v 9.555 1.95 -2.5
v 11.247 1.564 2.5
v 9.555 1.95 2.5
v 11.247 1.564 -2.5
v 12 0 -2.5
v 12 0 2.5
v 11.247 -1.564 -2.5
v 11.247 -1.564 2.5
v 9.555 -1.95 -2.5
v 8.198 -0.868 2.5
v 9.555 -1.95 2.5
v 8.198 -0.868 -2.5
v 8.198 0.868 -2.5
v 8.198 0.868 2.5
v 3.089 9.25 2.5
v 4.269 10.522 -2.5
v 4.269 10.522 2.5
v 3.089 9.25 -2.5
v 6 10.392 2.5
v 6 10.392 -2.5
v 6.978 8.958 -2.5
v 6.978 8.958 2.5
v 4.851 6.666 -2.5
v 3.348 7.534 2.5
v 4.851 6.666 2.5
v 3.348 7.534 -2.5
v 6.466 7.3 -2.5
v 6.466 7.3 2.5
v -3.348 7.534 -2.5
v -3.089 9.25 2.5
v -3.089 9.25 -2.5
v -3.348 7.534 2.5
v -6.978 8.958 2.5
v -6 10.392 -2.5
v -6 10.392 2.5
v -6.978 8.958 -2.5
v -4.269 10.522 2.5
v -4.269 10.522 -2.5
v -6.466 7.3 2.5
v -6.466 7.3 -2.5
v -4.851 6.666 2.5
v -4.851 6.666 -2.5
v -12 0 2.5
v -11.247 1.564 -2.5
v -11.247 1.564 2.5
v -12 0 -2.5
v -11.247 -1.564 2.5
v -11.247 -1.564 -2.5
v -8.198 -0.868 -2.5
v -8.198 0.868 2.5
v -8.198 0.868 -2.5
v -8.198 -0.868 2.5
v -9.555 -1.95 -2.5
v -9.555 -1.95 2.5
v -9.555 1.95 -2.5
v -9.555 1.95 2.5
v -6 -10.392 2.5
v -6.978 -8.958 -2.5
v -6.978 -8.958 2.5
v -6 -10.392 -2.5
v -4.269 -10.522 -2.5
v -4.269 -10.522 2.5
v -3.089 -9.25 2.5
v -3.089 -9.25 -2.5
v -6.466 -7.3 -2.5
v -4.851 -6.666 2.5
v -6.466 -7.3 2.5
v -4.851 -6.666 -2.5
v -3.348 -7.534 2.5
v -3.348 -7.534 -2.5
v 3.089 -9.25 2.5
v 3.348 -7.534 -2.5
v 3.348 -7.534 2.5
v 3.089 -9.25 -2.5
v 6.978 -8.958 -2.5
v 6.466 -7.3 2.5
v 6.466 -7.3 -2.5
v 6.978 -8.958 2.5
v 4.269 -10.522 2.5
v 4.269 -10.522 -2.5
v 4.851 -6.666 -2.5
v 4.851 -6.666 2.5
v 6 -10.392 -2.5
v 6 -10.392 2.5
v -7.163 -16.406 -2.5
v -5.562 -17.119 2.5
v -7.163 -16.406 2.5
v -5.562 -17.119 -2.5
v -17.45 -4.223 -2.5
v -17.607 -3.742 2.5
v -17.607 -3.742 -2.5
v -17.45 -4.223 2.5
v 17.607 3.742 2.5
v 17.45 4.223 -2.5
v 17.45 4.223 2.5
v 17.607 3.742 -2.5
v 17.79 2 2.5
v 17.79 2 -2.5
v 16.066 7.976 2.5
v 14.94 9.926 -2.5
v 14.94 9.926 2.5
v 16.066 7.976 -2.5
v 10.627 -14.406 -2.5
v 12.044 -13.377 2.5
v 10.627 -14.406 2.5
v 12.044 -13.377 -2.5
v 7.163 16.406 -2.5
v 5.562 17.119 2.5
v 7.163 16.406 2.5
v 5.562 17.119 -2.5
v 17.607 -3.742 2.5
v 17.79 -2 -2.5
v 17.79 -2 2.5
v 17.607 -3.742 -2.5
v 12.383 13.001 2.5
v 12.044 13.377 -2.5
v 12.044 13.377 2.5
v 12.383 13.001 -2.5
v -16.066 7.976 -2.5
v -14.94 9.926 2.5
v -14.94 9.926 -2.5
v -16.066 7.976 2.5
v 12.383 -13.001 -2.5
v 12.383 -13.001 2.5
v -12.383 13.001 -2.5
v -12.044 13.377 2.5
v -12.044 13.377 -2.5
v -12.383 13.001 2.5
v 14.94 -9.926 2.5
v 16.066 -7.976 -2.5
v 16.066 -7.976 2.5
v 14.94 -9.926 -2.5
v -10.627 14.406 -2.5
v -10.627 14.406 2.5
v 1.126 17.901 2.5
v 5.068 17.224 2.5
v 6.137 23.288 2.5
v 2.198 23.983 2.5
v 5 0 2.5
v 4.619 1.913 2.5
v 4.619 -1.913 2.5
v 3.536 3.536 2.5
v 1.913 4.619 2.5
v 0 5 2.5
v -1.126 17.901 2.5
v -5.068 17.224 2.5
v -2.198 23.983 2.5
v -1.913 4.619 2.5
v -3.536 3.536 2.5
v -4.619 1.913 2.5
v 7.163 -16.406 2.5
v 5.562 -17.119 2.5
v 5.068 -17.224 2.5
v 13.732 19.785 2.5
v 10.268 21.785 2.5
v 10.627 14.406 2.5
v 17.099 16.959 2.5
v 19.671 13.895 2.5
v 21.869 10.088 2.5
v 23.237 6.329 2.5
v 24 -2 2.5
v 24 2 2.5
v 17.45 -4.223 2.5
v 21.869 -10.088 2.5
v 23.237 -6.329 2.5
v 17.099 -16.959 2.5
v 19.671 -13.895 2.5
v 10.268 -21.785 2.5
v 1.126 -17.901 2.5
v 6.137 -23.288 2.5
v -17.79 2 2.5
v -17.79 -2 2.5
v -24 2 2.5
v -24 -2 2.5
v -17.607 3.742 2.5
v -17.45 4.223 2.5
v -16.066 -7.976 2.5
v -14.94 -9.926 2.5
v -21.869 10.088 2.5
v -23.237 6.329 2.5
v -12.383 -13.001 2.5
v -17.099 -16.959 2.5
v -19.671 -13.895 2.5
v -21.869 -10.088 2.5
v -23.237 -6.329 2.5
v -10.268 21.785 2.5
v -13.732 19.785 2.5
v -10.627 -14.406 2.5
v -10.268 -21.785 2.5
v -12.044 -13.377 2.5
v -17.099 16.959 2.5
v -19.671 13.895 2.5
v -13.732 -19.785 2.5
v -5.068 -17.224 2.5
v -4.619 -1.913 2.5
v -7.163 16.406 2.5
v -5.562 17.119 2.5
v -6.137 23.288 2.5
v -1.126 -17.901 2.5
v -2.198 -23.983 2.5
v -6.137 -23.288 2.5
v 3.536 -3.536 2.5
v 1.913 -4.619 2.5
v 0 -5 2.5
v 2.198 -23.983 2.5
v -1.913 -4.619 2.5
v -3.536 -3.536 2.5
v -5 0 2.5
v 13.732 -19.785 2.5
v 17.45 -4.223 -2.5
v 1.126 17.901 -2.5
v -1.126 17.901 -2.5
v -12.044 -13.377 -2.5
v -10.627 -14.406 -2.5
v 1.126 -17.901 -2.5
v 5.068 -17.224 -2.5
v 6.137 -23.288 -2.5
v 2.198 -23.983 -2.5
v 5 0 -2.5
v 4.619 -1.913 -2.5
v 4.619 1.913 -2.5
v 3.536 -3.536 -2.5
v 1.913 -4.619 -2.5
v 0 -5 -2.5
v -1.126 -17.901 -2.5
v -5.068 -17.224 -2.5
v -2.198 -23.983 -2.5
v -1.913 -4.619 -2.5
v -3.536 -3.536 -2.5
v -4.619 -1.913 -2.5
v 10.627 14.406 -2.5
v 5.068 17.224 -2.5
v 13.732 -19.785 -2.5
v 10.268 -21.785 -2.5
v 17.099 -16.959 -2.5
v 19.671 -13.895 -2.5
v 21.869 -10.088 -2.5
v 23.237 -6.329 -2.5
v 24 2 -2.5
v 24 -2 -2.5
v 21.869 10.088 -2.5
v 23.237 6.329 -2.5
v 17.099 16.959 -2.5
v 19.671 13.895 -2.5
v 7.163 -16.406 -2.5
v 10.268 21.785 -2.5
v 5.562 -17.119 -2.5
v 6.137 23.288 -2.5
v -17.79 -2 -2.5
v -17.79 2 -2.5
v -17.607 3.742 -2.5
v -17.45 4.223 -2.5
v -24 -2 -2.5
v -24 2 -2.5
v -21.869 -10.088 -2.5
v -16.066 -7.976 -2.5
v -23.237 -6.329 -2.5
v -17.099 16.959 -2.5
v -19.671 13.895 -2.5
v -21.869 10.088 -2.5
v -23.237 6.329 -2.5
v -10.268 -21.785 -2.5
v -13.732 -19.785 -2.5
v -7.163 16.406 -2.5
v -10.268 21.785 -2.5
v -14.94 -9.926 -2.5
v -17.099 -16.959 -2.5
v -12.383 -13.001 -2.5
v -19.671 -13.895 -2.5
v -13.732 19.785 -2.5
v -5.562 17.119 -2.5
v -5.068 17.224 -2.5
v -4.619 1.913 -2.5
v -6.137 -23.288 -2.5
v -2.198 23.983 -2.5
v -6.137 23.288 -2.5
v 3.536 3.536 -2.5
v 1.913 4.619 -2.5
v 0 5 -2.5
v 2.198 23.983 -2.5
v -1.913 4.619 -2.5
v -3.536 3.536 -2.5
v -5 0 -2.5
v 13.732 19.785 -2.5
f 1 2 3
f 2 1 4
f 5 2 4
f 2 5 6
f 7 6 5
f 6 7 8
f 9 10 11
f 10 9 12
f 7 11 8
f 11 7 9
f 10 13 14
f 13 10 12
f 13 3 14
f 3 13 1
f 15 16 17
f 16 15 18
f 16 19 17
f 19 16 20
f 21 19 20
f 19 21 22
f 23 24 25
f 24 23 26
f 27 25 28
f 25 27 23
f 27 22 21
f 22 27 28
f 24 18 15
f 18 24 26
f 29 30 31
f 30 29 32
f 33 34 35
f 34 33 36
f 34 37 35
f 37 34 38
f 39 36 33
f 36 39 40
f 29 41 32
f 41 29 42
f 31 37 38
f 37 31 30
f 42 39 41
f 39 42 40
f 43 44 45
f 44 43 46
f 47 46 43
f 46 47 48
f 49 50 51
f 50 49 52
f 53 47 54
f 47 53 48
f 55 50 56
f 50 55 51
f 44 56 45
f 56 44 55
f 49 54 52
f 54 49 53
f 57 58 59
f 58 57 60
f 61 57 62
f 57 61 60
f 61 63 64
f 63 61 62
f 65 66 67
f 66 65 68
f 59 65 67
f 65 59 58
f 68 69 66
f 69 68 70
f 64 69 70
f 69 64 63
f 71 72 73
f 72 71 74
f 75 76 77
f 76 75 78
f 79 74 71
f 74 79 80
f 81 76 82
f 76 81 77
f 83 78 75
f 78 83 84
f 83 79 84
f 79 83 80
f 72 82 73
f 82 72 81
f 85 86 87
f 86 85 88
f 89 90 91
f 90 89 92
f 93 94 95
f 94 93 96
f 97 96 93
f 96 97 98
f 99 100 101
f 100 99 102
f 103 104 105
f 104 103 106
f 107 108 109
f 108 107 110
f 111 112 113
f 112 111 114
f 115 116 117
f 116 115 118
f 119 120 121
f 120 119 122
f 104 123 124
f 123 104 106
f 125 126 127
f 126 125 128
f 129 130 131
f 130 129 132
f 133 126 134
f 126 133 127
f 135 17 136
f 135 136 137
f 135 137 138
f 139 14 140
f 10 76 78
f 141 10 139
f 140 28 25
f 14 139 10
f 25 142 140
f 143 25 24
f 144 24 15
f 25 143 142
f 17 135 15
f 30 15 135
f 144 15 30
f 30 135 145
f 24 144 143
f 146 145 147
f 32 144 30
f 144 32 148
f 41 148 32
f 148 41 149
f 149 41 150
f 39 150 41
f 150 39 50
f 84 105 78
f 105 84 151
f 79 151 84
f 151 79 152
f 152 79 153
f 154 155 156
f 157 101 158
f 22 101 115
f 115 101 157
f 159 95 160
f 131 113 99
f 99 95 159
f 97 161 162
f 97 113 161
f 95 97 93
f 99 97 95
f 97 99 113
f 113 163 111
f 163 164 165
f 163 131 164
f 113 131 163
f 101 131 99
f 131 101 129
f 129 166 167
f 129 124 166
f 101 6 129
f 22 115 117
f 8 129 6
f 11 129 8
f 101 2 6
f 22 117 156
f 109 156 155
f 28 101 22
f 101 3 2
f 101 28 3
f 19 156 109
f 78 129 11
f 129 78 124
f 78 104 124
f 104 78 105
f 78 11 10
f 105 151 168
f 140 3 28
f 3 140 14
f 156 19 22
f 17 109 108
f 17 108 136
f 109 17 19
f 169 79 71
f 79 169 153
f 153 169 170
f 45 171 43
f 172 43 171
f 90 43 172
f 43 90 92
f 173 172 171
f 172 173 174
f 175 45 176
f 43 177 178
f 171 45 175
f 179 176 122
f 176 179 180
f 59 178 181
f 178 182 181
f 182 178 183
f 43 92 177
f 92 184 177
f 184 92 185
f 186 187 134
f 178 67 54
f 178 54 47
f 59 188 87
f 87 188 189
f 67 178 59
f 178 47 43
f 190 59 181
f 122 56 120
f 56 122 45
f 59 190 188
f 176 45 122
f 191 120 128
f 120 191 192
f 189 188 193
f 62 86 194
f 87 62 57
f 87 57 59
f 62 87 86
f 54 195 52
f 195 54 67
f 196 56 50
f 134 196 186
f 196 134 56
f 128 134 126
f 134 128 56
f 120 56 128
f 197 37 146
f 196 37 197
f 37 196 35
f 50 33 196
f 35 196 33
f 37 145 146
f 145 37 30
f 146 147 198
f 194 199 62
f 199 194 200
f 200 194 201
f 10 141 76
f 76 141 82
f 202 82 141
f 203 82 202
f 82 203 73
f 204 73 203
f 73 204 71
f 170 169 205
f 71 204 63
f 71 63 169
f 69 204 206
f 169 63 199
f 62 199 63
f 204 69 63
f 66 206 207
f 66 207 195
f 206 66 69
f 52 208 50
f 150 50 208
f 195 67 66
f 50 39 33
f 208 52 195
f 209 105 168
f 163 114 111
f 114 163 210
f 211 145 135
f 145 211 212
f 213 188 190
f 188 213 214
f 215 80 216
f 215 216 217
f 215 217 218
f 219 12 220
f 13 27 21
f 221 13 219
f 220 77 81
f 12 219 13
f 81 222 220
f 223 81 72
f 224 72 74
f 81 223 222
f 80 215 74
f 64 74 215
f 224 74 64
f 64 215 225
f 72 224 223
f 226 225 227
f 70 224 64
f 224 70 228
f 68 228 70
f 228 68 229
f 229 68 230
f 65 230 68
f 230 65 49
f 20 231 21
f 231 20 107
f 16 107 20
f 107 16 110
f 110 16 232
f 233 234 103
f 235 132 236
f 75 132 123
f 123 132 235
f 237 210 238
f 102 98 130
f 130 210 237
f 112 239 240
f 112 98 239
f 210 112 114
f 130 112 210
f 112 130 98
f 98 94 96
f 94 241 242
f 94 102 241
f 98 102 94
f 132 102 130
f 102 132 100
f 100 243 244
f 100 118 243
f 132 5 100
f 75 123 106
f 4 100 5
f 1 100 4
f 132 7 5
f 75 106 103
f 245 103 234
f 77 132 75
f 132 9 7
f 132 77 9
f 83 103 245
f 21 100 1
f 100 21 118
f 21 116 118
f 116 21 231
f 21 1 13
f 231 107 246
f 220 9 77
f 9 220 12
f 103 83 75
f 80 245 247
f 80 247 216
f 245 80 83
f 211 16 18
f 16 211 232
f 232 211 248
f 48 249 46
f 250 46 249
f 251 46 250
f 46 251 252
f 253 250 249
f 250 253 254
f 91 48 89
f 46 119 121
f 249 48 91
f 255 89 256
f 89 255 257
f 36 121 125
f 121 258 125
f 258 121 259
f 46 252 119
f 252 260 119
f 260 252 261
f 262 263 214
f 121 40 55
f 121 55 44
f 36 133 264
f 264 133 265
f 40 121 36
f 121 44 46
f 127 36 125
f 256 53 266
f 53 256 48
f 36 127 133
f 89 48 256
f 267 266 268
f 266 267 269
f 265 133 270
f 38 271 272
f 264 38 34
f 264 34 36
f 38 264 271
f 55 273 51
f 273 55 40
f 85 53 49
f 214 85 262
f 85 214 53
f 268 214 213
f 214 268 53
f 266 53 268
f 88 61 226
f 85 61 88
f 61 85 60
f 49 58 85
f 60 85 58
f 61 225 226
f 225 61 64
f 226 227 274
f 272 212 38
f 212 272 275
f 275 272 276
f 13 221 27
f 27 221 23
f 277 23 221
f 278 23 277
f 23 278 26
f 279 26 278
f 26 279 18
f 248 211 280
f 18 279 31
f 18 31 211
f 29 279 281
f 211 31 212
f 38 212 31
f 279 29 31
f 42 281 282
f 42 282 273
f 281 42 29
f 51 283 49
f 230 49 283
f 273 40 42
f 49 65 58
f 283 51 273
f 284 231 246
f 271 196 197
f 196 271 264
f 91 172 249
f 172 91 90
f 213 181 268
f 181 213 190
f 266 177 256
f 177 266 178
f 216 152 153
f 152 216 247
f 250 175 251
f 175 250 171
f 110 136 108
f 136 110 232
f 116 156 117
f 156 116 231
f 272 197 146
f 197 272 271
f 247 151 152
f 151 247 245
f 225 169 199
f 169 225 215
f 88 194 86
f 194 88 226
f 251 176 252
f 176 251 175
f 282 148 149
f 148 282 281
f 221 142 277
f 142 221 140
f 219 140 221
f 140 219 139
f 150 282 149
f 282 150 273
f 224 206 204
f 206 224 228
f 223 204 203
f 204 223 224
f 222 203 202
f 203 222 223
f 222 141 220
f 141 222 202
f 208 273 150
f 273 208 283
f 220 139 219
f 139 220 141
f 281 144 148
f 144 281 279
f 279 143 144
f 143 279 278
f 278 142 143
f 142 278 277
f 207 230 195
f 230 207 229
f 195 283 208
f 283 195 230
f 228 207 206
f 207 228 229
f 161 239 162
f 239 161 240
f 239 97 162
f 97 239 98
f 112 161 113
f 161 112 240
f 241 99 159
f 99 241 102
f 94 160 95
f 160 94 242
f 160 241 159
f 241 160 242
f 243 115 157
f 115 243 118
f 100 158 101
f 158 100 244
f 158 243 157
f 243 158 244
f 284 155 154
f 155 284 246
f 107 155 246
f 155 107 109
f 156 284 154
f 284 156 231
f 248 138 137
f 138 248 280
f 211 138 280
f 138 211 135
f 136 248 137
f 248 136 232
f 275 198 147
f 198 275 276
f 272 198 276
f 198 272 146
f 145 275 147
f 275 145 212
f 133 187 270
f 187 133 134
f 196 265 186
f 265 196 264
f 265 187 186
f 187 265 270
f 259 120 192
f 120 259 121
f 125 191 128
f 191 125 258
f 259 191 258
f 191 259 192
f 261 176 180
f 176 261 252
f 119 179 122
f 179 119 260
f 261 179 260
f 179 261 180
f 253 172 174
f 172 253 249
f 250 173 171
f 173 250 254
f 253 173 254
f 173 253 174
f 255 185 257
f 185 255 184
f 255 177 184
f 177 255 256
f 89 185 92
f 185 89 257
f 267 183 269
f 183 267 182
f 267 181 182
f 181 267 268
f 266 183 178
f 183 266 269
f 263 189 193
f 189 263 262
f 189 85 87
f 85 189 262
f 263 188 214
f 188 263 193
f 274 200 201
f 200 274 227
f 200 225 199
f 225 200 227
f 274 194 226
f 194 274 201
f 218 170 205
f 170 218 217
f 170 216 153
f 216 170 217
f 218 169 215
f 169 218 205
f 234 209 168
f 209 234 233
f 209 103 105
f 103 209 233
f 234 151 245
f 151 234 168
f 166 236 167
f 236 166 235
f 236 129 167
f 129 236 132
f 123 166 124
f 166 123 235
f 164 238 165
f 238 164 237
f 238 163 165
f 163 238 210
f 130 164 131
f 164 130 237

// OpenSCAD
teeth = 18;
gear_radius = 18;
gear_height = 5;

tooth_w = 4;
tooth_l = 7;
tooth_h = 5;

module gear_body() {
    difference() {
        cylinder(h = gear_height, r = gear_radius, center = true);

        cylinder(h = gear_height + 1, r = 5, center = true);

        for (a = [0 : 60 : 300]) {
            rotate([0, 0, a]) {
                translate([10, 0, 0]) {
                    cylinder(h = gear_height + 1, r = 2, center = true);
                }
            }
        }
    }
}

module tooth(angle = 0) {
    rotate([0, 0, angle]) {
        translate([gear_radius + tooth_l / 2 - 1, 0, 0]) {
            cube([tooth_l, tooth_w, tooth_h], center = true);
        }
    }
}

module simple_gear() {
    union() {
        gear_body();

        for (a = [0 : 360 / teeth : 360 - 360 / teeth]) {
            tooth(a);
        }
    }
}

simple_gear();
